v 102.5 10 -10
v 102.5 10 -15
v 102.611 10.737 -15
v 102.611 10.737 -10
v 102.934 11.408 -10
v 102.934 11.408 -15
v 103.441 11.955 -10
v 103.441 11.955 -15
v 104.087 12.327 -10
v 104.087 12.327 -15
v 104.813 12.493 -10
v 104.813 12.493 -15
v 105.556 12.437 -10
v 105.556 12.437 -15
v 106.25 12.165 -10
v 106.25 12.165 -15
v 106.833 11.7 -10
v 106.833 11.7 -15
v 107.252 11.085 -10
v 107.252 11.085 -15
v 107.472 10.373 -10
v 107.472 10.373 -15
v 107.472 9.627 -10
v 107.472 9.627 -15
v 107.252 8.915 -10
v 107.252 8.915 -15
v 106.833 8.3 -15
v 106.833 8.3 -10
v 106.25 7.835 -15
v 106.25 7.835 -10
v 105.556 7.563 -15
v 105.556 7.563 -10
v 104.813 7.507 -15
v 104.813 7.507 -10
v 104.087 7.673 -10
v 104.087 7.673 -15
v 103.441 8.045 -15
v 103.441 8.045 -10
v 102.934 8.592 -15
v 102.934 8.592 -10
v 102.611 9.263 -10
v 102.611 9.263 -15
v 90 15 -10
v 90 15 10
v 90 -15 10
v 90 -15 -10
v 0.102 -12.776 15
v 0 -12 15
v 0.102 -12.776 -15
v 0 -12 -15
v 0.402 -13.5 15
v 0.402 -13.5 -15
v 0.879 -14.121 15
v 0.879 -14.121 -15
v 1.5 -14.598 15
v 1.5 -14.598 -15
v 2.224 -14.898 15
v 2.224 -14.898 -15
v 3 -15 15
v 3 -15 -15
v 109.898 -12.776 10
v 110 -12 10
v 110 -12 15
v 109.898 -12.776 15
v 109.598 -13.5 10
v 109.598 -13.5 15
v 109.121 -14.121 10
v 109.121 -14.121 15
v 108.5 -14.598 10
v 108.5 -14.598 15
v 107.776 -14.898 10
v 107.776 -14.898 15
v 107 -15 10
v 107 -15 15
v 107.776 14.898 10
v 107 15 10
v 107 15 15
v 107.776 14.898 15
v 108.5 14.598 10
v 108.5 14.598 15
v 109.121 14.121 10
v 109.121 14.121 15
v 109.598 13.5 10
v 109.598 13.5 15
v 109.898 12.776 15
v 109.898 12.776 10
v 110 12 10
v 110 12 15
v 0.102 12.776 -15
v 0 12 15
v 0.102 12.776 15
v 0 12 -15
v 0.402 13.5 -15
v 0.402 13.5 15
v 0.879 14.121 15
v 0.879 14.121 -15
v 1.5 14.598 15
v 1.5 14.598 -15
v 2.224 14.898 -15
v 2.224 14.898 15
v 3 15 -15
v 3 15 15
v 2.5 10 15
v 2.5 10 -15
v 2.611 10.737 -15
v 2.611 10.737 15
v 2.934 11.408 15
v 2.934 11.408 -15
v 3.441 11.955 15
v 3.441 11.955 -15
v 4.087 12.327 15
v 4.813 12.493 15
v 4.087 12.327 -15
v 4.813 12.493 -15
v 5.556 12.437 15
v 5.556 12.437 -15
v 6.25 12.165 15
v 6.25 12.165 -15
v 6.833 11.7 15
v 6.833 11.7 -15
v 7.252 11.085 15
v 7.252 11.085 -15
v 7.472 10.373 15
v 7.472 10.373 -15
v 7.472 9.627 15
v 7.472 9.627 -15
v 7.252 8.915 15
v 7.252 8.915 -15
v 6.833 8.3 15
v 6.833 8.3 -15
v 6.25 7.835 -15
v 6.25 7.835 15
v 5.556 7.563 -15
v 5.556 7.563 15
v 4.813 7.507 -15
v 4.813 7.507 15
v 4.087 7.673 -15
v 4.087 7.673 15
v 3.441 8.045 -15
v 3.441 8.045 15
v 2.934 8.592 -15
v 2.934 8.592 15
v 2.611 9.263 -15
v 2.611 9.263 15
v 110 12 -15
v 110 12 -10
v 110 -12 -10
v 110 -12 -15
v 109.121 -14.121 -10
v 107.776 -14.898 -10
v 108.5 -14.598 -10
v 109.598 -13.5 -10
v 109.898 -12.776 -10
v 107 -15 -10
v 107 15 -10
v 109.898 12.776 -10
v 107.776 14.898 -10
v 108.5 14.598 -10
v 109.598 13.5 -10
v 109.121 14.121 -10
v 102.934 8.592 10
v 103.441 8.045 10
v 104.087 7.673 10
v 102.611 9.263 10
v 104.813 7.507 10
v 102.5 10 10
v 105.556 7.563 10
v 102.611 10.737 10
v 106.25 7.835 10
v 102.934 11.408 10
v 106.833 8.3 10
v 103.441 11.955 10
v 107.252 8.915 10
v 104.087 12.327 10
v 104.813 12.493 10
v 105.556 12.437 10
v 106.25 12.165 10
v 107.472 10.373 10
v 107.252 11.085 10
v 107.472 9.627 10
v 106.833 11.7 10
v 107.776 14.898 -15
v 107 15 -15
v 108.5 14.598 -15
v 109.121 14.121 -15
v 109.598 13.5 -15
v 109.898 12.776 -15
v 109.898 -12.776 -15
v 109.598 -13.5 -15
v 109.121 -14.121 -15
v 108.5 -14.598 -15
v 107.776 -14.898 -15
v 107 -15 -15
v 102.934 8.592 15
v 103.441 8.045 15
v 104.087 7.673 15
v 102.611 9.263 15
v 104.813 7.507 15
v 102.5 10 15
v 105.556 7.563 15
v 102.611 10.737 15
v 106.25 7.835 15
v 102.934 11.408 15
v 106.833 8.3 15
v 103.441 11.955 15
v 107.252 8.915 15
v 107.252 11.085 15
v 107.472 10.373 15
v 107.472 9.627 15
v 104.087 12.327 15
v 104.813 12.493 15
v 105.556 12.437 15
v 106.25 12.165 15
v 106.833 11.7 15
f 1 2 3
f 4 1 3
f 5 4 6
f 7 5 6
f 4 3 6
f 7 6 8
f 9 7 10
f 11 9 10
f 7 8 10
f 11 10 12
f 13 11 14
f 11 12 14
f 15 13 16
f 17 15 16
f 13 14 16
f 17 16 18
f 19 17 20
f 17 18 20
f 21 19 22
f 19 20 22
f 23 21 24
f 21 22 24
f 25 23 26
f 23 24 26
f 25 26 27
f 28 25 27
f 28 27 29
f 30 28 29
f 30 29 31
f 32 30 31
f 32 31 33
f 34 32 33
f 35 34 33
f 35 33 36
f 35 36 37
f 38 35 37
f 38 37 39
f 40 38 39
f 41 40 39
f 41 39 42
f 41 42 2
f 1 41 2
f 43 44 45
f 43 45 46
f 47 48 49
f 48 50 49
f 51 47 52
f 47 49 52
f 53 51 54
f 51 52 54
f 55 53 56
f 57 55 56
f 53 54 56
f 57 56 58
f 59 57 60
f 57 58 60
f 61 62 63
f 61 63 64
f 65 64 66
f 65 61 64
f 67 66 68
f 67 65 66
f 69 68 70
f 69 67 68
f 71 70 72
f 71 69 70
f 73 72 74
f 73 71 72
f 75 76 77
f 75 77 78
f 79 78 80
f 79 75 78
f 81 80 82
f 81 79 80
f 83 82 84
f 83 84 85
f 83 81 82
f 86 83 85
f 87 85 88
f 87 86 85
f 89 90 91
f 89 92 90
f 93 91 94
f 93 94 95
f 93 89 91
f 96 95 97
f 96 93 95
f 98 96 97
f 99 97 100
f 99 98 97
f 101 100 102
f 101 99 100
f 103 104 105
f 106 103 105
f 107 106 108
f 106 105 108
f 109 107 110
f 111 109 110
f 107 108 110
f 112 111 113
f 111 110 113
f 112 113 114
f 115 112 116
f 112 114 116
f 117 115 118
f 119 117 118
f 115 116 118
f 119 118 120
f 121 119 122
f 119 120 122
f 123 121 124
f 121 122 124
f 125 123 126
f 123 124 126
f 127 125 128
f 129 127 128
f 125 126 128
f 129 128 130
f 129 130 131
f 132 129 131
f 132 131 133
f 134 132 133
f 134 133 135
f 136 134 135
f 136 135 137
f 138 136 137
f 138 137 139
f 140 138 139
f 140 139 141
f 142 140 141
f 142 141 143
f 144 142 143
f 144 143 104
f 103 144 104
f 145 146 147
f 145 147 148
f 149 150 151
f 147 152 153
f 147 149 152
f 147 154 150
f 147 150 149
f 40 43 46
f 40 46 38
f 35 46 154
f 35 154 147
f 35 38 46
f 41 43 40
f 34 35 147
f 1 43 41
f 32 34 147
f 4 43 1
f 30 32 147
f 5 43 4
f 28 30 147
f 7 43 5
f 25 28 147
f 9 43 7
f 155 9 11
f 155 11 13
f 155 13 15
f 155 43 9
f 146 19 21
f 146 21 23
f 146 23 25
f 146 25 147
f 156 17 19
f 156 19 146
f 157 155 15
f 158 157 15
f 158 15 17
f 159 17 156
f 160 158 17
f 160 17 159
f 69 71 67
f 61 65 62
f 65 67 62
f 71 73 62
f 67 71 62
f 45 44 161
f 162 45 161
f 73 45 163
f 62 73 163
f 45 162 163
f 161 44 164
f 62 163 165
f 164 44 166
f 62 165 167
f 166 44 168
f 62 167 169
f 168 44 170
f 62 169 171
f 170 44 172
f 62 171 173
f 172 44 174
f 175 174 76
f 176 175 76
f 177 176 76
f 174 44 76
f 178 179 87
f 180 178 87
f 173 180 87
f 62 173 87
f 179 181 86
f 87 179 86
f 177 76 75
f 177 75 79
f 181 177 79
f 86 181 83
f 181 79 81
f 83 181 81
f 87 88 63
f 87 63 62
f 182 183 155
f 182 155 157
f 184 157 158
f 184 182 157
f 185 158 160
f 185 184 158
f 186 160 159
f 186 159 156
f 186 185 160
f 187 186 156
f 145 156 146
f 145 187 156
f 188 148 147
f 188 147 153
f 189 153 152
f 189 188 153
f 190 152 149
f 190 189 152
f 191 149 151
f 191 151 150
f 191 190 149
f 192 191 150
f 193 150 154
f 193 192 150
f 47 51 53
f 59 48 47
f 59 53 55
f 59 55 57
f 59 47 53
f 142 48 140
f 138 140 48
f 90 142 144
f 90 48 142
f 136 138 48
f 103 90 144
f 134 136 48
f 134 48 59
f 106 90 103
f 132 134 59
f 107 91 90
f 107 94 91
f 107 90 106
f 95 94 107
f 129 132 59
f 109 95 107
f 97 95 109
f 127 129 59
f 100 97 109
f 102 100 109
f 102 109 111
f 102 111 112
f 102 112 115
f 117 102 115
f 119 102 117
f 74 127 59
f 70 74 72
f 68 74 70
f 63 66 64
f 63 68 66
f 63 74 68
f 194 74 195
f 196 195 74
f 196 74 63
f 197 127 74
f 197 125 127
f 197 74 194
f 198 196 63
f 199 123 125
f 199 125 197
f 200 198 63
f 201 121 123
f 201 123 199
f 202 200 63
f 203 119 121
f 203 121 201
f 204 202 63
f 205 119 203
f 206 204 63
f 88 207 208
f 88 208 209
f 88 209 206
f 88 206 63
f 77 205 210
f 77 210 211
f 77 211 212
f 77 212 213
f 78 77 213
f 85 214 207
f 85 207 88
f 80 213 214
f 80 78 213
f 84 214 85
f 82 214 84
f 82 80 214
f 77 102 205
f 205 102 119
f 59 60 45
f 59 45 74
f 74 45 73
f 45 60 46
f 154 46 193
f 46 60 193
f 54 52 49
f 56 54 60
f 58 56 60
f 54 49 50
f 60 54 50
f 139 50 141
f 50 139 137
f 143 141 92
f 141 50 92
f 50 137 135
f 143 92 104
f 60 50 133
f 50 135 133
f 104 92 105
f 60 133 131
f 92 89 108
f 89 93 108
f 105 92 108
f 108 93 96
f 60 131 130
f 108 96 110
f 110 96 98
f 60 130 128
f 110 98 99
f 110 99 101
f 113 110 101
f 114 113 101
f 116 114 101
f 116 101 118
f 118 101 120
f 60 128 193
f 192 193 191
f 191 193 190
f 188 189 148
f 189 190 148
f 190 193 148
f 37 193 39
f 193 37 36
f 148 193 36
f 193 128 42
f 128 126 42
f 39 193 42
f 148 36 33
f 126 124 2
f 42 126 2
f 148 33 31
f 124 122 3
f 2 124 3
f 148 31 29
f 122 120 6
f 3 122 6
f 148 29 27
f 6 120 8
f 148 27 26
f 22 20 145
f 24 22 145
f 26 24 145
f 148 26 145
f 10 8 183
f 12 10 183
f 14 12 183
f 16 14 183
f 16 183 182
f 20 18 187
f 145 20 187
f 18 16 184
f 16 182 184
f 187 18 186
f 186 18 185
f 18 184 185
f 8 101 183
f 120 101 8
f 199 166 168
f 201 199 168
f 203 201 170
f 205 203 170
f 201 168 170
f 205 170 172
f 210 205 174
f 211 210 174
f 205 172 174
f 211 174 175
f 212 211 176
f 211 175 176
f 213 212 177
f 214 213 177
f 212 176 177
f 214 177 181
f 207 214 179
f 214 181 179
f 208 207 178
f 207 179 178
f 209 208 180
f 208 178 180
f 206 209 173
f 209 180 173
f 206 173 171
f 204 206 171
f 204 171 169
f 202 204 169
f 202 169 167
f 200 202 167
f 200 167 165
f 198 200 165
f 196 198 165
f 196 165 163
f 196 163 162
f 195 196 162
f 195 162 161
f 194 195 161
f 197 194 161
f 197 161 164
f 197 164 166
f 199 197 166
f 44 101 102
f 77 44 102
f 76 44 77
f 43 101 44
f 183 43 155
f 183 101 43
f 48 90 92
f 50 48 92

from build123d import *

# Parameters (mm, degrees)
ESQUISSE2_W             = 110
ESQUISSE2_H             = 30
BOSS_EXTRU_1_DEPTH      = 15
CONG_1_R                = 3
ESQUISSE4_W             = 20
ESQUISSE4_H             = 20
ENL_V_MAT_EXTRU_1_DEPTH = 31
ESQUISSE5_R             = 2.5
ENL_V_MAT_EXTRU_2_DEPTH = 31


with BuildPart() as part:
    # Esquisse2 → Boss.-Extru.1 (new body, symmetric)
    with BuildSketch(Plane(origin=(0, 0, 0), x_dir=(1, 0, 0), z_dir=(0, 1, 0))):
        with Locations((55, 0)):
            Rectangle(ESQUISSE2_W, ESQUISSE2_H)
    extrude(amount=BOSS_EXTRU_1_DEPTH, both=True)

    # Congé1
    cong_1_edges = [part.edges().sort_by_distance(p)[0] for p in [
        (110, 15, 0),
        (0, 15, 0),
        (110, -15, 0),
        (0, -15, 0),
    ]]
    fillet(cong_1_edges, radius=CONG_1_R)

    # Esquisse4 → Enlèv. mat.-Extru.1 (cut, through all)
    with BuildSketch(Plane(origin=(0, 15, 0), x_dir=(1, 0, 0), z_dir=(0, 1, 0))):
        with Locations((100, 0)):
            Rectangle(ESQUISSE4_W, ESQUISSE4_H)
    extrude(amount=-ENL_V_MAT_EXTRU_1_DEPTH, mode=Mode.SUBTRACT)

    # Esquisse5 → Enlèv. mat.-Extru.2 (cut, through all)
    with BuildSketch(Plane(origin=(0, 0, -15), x_dir=(-1, 0, 0), z_dir=(0, 0, -1))):
        with Locations((-105, 10)):
            Circle(ESQUISSE5_R)
        with Locations((-5, 10)):
            Circle(ESQUISSE5_R)
    extrude(amount=-ENL_V_MAT_EXTRU_2_DEPTH, mode=Mode.SUBTRACT)


solid = part.part
